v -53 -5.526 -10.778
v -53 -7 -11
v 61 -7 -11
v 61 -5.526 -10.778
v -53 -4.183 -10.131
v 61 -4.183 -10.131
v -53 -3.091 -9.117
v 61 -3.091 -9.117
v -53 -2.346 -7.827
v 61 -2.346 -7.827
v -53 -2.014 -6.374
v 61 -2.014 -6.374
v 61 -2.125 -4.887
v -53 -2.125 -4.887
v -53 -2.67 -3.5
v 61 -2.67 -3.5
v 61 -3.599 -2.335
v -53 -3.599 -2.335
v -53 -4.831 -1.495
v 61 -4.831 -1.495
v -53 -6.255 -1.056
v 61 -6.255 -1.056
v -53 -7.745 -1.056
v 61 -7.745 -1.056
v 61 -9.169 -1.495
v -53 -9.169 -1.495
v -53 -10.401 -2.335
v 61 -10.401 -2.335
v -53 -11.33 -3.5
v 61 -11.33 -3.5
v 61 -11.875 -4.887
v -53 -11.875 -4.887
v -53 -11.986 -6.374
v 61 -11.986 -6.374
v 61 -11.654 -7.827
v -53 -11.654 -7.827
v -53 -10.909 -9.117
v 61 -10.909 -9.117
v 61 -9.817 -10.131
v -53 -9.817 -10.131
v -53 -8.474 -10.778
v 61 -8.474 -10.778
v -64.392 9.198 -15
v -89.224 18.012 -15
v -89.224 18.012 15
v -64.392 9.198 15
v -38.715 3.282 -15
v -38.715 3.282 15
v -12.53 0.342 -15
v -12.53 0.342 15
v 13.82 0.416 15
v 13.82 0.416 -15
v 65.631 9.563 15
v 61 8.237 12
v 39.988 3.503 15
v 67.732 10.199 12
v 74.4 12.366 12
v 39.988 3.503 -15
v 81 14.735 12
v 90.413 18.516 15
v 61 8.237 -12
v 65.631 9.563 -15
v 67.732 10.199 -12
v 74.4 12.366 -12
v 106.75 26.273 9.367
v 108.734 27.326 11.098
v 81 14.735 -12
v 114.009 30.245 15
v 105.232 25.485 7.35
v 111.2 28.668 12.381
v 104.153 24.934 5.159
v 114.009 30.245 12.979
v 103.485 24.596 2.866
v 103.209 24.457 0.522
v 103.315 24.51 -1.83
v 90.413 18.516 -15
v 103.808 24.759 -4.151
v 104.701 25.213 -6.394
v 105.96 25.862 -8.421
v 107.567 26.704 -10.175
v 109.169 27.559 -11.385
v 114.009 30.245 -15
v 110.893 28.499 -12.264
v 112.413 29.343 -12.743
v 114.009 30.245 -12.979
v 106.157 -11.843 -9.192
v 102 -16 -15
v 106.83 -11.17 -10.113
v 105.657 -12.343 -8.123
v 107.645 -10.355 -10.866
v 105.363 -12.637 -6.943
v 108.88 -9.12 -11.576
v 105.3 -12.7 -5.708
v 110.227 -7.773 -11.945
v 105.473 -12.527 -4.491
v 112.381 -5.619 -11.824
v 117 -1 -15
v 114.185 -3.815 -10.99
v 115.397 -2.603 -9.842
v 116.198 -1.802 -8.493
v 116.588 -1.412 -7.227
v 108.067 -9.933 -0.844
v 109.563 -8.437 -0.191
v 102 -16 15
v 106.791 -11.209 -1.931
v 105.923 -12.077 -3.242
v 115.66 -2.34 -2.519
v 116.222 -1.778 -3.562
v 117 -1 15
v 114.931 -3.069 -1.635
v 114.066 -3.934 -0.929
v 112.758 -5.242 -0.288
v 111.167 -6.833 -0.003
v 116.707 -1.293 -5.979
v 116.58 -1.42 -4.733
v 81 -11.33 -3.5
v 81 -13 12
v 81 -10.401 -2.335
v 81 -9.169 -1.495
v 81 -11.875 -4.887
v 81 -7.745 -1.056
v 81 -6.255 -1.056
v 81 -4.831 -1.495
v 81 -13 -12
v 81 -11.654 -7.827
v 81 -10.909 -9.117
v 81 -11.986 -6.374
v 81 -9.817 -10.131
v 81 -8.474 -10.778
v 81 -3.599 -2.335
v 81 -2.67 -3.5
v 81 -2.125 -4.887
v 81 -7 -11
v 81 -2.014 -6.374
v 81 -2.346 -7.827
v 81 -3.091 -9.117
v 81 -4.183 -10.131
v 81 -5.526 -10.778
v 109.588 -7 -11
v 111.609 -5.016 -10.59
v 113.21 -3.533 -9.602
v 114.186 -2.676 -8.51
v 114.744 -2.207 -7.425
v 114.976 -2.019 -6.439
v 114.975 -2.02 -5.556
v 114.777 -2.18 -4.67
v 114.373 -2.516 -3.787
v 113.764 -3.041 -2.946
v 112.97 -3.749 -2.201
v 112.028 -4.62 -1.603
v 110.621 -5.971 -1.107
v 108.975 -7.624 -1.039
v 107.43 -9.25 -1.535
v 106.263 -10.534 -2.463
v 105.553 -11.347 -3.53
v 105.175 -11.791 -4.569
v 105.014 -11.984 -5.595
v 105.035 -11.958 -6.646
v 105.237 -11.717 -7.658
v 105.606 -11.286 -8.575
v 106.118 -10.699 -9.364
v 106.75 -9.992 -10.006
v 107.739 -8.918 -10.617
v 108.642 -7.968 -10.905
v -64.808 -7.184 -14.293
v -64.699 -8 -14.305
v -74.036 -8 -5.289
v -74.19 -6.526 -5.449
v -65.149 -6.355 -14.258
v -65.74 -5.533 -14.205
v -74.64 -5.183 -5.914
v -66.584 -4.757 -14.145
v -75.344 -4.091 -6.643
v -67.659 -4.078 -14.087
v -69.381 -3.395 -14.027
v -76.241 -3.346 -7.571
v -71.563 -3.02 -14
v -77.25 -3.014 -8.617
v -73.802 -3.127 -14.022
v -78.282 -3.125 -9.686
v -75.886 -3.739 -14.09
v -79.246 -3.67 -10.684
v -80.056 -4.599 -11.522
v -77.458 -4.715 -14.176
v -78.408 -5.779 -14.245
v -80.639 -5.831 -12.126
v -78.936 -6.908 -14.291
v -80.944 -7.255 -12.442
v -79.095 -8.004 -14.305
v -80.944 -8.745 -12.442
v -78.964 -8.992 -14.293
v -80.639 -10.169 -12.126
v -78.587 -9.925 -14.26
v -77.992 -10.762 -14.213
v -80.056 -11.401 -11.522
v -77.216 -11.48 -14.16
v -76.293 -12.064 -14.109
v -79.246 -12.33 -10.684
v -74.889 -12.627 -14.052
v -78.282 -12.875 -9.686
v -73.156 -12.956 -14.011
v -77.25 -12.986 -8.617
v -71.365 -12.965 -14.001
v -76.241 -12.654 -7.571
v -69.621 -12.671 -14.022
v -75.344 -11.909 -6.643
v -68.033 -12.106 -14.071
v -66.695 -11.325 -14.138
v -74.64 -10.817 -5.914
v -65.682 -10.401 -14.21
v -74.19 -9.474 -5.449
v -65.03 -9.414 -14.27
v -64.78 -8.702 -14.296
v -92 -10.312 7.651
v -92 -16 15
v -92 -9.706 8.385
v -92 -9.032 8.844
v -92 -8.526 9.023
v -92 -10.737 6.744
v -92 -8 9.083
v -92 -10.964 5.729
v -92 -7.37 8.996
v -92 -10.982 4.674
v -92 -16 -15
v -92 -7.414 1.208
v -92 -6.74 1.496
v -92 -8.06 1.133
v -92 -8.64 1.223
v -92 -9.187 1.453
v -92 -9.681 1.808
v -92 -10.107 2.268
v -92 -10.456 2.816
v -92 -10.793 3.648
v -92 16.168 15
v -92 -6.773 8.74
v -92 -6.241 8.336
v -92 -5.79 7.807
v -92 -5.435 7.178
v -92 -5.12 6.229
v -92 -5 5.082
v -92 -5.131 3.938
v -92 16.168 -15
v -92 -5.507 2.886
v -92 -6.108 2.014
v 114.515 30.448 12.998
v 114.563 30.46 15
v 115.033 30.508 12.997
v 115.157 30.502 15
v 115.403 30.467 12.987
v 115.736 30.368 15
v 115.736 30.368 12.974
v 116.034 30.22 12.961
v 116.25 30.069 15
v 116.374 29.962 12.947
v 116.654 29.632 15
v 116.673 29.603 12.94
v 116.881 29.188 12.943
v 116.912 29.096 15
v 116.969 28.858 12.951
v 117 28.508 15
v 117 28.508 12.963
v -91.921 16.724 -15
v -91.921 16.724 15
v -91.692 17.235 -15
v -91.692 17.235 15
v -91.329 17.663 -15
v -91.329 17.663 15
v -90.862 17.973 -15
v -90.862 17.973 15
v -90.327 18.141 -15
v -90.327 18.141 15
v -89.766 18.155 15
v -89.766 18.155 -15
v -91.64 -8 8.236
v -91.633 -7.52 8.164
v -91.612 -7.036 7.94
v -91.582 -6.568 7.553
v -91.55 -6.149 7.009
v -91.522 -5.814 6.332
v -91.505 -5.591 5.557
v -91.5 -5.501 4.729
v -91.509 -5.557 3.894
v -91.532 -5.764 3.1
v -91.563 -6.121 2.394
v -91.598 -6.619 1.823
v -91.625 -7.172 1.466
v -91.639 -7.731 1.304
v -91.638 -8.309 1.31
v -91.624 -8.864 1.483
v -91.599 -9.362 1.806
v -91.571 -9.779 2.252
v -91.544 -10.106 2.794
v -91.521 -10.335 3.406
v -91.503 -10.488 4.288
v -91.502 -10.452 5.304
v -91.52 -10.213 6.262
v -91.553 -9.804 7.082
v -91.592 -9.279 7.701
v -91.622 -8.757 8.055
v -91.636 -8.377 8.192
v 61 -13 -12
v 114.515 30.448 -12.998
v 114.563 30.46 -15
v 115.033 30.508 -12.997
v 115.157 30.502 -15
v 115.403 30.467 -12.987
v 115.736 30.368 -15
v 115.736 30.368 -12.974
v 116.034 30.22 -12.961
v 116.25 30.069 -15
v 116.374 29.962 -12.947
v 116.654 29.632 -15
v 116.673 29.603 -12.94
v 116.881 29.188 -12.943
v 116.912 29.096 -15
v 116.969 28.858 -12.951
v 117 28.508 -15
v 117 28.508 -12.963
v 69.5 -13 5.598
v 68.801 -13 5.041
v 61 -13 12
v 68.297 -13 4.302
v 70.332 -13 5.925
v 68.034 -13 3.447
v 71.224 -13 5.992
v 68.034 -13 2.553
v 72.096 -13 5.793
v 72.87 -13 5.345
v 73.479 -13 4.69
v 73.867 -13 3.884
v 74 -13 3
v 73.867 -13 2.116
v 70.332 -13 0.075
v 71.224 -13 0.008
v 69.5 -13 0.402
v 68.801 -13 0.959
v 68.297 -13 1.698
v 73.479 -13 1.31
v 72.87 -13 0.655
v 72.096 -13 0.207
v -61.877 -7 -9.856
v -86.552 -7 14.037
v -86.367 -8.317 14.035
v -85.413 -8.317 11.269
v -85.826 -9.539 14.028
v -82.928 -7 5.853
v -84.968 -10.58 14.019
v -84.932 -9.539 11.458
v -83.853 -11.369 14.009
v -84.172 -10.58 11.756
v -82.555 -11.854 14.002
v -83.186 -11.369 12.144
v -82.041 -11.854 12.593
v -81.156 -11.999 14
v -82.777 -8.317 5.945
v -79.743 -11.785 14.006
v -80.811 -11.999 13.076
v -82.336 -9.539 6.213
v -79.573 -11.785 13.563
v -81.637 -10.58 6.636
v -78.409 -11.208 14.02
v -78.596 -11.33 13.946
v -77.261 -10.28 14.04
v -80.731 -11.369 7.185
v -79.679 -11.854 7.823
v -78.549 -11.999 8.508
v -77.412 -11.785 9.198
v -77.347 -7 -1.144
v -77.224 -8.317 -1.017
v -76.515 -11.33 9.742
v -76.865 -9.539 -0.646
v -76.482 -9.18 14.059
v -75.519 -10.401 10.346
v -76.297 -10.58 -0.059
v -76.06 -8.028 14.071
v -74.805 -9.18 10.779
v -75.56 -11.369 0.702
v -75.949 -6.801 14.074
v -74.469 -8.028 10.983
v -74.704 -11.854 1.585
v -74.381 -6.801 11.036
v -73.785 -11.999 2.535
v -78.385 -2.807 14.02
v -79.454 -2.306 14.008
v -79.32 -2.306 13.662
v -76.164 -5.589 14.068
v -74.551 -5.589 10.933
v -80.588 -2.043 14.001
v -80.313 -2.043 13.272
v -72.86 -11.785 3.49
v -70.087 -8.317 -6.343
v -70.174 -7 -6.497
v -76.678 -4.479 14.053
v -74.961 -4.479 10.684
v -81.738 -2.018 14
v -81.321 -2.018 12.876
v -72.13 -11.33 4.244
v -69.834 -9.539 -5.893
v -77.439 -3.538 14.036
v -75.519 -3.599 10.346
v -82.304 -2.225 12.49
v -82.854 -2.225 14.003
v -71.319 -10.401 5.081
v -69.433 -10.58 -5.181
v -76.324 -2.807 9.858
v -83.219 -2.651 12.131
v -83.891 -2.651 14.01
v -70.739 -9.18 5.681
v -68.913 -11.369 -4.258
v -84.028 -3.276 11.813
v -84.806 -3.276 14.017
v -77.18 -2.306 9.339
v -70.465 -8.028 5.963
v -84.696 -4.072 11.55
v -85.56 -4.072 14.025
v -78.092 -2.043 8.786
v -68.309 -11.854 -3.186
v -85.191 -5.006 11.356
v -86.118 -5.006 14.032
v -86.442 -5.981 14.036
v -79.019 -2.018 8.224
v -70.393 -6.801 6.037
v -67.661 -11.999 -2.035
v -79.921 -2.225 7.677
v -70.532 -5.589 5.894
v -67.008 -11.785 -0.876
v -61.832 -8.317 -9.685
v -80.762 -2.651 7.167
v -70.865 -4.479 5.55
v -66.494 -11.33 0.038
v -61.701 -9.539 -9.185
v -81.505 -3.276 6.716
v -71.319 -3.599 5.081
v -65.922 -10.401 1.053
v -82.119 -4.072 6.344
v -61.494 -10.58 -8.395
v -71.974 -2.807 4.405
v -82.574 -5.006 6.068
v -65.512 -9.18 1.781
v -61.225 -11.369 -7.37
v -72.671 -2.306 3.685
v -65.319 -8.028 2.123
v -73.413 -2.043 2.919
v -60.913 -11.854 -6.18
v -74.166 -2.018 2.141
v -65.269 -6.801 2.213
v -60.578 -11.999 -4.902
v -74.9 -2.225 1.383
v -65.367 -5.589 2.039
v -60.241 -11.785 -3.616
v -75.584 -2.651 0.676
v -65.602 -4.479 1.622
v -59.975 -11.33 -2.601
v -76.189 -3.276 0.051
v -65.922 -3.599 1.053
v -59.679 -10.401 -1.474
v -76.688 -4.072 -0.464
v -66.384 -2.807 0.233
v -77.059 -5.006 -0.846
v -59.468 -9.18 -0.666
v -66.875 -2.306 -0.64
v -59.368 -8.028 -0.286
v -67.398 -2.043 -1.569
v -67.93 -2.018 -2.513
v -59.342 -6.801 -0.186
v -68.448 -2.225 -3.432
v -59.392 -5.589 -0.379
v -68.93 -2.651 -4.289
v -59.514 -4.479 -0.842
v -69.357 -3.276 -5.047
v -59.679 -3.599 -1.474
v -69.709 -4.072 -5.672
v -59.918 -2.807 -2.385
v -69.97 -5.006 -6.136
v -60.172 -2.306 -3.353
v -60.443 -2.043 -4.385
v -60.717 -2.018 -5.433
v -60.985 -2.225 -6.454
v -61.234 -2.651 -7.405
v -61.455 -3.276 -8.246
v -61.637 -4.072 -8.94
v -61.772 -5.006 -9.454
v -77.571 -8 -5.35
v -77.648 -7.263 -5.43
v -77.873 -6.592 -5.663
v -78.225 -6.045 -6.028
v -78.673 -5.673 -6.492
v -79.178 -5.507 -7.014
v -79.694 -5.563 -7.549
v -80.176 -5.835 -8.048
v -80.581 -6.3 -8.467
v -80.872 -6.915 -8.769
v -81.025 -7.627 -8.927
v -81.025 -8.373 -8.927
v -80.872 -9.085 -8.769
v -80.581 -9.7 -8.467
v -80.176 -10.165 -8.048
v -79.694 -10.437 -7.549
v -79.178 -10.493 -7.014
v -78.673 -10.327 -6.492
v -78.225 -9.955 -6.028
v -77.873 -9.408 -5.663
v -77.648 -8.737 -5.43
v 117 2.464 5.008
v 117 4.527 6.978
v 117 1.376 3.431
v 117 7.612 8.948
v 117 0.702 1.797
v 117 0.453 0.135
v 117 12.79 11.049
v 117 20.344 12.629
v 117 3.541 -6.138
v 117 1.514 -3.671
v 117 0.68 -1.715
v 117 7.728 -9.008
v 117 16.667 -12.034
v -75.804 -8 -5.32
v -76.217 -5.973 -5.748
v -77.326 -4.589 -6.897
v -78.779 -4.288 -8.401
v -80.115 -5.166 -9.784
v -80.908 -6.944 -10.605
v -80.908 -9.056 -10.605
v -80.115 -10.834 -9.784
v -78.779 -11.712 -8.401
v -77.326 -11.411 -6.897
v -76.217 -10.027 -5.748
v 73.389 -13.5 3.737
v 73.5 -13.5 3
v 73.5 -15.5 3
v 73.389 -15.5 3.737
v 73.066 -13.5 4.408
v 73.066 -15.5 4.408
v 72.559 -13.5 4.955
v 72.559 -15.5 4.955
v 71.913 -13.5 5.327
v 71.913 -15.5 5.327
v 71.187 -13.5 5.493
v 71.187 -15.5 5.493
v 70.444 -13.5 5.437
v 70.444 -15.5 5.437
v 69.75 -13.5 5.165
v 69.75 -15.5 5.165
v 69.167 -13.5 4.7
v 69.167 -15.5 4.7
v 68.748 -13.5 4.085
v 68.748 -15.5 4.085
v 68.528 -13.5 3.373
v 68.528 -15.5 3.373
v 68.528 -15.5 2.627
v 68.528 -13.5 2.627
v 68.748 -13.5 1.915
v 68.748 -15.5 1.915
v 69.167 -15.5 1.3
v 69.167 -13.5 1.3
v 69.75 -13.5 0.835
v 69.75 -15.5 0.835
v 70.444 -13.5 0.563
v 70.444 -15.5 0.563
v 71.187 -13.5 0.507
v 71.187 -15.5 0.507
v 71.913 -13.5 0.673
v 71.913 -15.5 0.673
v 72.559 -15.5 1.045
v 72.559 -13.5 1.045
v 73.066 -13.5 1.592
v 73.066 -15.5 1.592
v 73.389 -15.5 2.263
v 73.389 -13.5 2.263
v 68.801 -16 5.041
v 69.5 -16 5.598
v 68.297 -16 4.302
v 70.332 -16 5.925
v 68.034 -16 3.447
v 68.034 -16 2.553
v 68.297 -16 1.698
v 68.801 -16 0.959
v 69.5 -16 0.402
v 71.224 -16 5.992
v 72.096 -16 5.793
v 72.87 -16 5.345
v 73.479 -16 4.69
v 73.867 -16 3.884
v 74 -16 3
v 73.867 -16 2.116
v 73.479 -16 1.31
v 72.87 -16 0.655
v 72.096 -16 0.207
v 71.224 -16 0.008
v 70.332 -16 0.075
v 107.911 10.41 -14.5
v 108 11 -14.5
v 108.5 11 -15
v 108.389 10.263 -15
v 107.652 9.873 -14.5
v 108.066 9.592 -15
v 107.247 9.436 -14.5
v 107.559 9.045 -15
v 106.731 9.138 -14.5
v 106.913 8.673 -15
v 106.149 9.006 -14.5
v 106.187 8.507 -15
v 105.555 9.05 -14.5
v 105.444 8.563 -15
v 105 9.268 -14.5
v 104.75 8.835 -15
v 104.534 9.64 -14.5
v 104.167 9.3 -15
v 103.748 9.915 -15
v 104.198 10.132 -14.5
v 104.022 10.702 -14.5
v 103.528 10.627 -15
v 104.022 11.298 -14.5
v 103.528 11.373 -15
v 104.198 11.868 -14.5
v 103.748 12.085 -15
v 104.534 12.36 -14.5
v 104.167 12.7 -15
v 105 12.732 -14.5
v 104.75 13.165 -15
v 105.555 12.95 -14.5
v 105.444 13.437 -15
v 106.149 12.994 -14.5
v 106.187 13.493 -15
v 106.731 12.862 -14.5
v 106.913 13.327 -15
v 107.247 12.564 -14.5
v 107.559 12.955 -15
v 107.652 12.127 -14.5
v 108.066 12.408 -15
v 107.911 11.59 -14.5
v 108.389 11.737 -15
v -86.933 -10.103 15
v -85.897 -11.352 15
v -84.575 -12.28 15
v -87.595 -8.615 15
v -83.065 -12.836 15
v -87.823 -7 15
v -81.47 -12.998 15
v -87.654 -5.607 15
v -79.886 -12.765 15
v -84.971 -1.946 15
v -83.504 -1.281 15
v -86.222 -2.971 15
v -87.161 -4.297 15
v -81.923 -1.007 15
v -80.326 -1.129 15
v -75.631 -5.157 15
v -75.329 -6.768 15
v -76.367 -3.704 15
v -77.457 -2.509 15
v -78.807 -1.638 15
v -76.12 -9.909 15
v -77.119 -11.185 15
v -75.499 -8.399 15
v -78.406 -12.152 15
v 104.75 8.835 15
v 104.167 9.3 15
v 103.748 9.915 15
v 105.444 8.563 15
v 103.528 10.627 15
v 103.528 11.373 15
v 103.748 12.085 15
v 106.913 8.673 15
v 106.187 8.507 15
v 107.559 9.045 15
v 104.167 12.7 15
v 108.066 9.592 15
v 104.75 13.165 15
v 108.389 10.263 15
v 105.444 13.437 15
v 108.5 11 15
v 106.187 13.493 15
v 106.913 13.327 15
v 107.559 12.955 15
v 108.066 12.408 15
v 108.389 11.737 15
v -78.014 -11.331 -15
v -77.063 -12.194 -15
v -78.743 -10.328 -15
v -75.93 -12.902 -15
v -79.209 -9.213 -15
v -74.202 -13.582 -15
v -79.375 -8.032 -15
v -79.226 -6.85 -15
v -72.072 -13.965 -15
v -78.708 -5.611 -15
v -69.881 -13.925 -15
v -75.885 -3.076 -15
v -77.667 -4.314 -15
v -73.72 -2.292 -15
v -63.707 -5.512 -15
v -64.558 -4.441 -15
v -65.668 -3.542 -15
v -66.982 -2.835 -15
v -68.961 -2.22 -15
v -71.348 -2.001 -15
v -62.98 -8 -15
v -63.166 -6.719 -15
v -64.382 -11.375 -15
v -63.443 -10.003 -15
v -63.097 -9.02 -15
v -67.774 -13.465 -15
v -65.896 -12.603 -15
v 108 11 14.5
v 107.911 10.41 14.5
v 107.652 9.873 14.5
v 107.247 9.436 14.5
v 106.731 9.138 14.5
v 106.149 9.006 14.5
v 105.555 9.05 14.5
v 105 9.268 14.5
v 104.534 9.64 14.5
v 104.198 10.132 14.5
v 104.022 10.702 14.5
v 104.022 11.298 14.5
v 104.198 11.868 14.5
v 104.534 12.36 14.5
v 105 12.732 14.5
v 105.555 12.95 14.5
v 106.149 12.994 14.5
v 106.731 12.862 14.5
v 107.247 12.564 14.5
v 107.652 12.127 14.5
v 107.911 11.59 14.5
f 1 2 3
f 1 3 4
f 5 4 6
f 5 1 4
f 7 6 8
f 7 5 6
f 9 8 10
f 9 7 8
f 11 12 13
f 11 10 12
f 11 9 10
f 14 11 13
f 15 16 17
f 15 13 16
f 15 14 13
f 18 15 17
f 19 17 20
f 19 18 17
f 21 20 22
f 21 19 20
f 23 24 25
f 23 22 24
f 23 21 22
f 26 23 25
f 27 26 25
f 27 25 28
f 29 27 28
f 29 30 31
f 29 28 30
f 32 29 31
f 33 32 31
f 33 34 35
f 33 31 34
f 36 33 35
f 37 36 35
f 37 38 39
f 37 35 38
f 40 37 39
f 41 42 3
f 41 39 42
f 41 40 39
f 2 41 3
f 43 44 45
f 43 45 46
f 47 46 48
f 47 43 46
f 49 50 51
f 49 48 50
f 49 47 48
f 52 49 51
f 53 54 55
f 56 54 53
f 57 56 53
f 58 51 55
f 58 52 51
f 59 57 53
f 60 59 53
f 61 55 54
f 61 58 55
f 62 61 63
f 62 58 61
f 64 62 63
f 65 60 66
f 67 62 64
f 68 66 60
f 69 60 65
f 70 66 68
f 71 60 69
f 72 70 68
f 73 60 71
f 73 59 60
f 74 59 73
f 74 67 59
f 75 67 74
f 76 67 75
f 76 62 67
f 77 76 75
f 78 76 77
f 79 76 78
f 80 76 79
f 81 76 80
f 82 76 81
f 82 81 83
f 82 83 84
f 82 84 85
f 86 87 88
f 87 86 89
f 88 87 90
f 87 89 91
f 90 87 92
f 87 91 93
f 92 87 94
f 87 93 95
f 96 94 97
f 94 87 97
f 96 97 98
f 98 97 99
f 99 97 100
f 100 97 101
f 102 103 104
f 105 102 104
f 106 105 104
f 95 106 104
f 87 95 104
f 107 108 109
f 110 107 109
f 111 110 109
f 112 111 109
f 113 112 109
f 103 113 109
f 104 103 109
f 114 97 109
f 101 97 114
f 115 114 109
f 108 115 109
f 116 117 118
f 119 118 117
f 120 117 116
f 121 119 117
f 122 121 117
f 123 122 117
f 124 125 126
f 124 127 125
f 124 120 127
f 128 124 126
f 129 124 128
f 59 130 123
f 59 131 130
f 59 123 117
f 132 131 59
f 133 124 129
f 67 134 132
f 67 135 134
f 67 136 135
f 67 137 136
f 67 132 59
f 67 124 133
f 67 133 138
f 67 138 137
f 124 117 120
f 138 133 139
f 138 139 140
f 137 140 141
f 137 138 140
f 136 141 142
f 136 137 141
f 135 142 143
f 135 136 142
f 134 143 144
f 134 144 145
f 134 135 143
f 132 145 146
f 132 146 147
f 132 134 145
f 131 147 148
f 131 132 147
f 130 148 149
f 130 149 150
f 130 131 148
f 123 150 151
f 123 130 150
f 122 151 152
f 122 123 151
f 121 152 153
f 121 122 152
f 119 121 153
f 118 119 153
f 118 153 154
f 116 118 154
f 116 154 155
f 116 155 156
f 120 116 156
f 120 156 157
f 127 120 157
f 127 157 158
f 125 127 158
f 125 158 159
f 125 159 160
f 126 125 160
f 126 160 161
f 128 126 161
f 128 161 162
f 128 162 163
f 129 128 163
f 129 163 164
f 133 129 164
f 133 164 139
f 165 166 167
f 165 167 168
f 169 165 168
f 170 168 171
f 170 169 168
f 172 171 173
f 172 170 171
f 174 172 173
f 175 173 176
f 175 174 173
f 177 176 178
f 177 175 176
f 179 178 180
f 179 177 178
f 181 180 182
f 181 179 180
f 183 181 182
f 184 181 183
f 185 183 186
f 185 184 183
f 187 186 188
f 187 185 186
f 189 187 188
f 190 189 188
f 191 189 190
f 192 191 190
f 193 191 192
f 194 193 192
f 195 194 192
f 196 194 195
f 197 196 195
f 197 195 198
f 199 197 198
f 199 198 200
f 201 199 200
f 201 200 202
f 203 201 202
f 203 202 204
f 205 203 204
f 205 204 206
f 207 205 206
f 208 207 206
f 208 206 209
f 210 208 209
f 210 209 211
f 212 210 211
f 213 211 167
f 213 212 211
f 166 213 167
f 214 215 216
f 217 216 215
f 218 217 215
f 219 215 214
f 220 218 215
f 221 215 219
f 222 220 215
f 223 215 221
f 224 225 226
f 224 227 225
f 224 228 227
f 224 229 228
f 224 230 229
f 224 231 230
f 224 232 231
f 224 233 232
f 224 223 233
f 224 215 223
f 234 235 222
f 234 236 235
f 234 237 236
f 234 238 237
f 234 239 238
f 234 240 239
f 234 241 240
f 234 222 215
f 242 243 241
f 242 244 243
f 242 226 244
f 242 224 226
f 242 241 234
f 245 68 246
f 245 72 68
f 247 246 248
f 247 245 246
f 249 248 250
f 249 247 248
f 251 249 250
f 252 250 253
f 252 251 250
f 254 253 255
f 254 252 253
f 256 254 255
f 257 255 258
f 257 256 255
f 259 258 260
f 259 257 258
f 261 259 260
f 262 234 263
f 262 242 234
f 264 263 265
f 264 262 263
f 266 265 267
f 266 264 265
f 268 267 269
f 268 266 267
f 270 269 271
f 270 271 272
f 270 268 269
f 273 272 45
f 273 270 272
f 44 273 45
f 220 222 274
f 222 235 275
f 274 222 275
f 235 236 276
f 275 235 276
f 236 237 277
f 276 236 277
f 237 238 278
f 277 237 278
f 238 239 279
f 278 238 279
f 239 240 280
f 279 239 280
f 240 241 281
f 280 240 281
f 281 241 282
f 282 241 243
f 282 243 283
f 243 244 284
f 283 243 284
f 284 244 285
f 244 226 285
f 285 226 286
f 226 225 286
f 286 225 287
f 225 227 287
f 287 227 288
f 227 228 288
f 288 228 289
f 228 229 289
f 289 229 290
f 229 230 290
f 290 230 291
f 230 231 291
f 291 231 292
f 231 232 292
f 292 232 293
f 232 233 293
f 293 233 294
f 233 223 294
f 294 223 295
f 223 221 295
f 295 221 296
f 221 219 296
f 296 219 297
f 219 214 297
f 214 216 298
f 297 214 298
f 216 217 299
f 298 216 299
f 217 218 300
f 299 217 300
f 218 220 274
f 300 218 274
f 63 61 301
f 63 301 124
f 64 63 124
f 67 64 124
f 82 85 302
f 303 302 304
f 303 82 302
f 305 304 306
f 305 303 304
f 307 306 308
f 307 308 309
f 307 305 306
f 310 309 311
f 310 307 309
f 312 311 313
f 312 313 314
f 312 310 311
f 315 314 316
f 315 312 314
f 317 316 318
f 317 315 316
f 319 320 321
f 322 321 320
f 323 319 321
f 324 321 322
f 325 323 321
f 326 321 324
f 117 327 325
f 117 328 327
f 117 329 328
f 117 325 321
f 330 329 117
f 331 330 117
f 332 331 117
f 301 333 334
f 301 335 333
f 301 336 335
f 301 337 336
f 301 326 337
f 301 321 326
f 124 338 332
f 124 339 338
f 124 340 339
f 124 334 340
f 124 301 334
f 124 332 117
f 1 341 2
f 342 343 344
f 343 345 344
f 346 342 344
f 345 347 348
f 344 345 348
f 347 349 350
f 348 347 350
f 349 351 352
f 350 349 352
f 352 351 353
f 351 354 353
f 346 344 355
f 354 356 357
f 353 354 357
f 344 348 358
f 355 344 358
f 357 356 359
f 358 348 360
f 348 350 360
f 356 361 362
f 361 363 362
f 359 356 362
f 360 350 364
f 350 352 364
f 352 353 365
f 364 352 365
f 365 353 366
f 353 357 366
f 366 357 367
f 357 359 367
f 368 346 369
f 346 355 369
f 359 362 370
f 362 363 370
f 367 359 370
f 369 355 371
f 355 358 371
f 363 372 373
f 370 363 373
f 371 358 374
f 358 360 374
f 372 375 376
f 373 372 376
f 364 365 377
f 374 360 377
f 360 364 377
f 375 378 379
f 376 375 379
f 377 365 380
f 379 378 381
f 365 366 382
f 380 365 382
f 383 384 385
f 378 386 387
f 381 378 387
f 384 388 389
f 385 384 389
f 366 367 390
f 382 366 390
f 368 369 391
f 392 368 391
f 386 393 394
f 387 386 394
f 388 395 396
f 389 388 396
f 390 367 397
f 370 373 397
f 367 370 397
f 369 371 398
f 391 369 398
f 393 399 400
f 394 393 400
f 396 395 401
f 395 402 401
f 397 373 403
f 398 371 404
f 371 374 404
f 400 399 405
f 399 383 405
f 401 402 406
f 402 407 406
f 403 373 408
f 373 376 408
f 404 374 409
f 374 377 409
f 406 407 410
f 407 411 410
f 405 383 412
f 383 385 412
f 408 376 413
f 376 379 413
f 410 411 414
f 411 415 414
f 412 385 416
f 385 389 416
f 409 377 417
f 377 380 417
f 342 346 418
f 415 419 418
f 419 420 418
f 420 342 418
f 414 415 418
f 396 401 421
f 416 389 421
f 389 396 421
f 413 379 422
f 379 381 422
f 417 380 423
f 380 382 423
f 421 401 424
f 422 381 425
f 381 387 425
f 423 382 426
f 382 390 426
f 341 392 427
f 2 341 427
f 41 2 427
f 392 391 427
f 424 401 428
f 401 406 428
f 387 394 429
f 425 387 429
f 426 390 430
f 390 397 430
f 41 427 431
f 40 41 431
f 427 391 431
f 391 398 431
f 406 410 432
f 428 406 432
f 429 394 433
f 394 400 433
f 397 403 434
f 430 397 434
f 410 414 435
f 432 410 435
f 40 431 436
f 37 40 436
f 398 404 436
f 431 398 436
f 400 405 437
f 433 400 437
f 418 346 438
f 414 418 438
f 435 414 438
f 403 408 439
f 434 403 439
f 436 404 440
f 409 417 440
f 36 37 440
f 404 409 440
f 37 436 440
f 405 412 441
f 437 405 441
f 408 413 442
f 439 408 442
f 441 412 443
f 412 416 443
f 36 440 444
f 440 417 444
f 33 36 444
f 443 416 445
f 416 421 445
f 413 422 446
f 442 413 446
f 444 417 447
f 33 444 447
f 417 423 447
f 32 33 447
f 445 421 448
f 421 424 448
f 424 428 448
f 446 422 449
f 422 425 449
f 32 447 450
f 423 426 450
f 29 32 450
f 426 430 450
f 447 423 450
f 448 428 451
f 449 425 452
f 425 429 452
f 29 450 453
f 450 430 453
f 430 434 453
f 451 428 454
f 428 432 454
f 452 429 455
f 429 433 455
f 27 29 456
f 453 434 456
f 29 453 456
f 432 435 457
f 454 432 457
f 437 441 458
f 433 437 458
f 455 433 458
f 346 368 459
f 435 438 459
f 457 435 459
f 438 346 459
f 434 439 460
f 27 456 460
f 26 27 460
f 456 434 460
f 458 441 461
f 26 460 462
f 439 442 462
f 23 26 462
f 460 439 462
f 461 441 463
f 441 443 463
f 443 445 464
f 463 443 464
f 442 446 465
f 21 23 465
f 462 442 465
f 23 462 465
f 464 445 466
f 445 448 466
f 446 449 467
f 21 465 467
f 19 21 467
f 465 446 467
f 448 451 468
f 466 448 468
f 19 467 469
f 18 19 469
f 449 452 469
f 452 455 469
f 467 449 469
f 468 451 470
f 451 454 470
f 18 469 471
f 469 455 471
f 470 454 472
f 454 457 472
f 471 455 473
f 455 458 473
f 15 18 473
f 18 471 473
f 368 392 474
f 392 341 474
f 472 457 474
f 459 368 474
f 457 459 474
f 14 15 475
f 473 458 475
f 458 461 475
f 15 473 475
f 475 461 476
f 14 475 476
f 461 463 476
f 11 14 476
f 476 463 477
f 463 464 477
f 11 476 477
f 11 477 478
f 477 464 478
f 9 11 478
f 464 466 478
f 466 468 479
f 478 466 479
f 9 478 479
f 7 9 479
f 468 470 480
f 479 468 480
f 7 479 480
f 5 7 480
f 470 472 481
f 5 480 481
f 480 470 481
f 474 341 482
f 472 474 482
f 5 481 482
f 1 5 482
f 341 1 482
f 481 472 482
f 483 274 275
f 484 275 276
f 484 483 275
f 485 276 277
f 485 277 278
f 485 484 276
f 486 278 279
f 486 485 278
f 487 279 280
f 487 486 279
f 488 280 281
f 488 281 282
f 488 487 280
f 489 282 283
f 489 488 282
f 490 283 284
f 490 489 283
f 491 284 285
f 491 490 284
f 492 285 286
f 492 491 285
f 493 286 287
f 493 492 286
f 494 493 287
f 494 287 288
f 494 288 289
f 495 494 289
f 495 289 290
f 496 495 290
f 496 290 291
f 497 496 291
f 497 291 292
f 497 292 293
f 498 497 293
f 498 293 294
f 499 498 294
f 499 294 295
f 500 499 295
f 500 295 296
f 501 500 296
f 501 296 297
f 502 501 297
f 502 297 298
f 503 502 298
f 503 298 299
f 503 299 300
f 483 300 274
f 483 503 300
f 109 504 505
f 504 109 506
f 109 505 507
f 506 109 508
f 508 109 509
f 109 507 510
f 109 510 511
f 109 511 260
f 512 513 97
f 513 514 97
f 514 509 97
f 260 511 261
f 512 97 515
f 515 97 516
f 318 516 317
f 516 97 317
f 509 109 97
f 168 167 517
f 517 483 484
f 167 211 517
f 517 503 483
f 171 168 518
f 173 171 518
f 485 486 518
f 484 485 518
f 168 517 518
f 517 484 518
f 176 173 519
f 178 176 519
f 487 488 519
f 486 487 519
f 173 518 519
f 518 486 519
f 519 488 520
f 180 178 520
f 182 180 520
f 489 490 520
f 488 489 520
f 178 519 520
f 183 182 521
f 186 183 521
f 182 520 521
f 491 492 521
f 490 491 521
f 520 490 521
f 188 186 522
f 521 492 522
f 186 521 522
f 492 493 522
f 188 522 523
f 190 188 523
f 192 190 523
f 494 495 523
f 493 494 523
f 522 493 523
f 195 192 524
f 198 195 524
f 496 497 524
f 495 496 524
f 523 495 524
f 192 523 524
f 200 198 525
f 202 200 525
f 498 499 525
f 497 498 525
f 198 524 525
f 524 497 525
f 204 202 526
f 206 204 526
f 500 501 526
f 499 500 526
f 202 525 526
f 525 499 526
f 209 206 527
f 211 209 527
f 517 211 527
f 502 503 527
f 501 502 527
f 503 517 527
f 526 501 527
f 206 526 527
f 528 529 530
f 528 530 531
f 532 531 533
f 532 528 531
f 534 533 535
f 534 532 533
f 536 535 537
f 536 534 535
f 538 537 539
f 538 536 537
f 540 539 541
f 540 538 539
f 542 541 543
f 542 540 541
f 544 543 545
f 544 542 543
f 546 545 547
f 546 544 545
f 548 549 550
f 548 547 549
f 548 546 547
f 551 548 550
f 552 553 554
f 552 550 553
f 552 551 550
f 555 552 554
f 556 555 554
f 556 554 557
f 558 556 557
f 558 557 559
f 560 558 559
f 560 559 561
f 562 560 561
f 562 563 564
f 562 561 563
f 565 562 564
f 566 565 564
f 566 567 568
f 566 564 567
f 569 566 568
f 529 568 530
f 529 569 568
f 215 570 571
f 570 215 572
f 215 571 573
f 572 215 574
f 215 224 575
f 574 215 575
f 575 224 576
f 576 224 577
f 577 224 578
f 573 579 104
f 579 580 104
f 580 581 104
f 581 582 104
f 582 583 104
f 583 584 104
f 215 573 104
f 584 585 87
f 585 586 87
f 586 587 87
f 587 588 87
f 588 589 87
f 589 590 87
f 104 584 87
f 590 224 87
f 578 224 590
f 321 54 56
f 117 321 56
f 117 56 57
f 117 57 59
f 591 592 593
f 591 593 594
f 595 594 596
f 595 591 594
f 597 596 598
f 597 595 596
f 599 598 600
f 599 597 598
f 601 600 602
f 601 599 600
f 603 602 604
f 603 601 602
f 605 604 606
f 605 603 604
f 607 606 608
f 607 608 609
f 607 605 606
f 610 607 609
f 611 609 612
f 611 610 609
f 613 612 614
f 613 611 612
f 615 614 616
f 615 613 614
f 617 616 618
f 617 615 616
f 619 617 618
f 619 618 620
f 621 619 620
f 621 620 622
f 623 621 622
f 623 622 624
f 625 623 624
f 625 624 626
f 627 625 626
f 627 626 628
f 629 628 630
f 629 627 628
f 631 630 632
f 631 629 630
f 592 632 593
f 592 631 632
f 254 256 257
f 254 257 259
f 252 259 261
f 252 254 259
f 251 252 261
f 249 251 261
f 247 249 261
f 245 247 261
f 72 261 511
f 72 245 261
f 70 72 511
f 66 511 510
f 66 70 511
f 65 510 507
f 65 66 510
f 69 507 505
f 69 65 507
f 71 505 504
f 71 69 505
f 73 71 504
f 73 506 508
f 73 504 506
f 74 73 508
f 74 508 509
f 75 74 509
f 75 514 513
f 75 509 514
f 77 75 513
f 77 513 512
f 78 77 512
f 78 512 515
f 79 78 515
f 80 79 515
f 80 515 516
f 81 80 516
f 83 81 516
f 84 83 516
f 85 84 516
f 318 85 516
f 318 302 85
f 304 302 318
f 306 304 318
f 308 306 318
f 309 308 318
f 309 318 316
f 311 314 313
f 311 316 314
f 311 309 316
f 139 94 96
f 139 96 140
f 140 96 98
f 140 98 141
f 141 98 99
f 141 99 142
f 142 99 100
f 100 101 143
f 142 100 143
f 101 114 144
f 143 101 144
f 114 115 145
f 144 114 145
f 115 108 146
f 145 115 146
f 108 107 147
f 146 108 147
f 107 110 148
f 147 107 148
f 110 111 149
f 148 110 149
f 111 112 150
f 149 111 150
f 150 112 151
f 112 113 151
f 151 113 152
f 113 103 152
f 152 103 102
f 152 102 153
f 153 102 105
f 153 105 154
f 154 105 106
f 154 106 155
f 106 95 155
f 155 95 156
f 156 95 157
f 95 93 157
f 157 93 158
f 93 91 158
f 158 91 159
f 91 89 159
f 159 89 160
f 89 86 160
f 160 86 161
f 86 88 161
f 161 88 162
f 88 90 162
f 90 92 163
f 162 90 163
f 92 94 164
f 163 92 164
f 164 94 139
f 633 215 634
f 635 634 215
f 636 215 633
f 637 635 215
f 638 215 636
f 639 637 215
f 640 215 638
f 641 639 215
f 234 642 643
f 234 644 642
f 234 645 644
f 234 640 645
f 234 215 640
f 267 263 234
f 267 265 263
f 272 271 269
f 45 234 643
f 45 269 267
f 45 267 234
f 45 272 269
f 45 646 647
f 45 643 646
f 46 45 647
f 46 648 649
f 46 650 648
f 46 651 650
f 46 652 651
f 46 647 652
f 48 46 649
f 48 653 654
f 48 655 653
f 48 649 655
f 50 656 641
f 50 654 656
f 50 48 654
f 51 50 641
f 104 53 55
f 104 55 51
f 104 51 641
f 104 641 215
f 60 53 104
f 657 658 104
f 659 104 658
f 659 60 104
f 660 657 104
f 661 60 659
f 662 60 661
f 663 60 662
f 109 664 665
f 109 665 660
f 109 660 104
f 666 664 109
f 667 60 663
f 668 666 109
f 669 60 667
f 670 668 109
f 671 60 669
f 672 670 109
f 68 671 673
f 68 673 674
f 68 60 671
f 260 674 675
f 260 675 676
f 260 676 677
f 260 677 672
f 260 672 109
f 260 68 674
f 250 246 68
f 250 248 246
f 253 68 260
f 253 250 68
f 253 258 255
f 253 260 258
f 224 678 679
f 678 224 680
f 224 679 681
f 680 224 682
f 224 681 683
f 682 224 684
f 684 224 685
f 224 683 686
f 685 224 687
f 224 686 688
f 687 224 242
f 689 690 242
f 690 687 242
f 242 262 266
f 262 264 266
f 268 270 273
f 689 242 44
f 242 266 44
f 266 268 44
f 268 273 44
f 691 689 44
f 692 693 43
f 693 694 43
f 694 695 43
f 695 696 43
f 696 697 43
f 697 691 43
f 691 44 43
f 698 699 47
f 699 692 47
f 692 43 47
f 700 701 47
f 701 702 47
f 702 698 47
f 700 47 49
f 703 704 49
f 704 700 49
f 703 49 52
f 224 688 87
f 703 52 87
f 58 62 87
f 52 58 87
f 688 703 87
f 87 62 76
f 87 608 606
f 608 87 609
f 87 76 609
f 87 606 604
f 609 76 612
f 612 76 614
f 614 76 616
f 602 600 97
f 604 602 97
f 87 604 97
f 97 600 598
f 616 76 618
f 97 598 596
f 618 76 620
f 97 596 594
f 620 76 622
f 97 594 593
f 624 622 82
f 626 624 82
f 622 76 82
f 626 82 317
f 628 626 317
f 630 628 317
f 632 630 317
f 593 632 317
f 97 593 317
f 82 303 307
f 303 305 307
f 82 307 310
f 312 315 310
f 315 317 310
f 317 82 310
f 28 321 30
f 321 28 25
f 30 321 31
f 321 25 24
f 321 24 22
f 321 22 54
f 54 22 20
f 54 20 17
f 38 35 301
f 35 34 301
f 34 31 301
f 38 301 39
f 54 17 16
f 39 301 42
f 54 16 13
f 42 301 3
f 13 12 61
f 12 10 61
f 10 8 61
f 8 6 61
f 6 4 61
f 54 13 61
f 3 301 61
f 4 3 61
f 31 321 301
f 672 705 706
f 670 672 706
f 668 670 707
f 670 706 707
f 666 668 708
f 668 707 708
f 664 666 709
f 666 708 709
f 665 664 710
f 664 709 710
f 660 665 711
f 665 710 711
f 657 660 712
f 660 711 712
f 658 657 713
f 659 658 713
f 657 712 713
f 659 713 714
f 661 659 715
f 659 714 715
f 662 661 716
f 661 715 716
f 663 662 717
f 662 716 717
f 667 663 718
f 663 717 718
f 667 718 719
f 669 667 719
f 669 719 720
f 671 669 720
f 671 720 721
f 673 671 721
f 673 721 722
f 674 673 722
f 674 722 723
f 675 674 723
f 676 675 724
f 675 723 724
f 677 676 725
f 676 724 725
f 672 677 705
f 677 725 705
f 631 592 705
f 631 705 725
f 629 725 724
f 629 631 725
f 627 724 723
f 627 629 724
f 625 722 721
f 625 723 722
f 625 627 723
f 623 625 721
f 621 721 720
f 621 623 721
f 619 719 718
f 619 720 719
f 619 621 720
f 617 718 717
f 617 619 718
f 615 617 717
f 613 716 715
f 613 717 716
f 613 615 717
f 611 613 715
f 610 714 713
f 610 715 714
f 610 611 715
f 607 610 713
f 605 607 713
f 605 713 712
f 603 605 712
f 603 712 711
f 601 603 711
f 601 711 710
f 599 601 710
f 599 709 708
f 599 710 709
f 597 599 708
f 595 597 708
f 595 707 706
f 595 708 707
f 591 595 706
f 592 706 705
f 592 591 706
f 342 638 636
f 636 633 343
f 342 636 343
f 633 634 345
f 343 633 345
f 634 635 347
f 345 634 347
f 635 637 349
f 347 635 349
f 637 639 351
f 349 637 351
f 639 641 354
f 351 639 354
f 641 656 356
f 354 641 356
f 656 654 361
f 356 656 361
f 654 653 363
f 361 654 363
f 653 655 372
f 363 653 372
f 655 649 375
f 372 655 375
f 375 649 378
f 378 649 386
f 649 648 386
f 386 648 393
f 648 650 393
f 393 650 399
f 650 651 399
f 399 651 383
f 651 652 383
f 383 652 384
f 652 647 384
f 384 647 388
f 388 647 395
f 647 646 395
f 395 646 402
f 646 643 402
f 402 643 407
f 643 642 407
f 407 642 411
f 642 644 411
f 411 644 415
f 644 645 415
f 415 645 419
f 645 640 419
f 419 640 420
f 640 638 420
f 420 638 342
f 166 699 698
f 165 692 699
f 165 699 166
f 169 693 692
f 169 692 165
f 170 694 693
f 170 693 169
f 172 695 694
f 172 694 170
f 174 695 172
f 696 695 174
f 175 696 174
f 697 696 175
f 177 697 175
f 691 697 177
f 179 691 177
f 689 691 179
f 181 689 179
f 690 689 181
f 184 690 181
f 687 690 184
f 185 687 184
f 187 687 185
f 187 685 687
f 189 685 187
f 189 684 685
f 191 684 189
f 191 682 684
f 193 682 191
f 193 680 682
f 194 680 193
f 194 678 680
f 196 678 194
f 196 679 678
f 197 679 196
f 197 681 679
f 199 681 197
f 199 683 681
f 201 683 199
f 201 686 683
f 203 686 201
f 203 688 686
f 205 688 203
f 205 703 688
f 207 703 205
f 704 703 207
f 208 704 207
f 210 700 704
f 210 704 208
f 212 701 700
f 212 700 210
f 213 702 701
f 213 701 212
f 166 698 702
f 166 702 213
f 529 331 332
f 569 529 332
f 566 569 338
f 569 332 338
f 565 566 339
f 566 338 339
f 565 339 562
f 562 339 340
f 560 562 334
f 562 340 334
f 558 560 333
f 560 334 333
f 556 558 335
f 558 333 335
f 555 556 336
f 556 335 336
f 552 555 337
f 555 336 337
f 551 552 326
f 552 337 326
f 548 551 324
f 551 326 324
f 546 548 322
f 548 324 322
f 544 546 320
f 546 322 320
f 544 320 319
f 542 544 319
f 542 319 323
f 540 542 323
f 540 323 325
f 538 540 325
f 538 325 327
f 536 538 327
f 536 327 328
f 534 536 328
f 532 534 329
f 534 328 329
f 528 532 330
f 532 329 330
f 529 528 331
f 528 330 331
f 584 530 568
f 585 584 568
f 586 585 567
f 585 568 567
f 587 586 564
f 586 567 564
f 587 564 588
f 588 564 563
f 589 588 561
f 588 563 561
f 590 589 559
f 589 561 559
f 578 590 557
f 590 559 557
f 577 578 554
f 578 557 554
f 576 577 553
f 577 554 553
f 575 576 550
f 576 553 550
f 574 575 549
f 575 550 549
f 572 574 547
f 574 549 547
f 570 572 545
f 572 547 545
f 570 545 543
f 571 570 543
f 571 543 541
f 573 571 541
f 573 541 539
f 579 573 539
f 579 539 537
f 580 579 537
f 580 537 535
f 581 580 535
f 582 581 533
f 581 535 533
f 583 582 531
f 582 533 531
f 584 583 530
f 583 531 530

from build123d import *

# Parameters (mm, degrees)
CYLINDER006_R               = 2.5
CYLINDER006_DEPTH           = 35
BOX004_W                    = 20
BOX004_H                    = 52
BOX004_DEPTH                = 24
CYLINDER005_R               = 5
CYLINDER005_DEPTH           = 20
CYLINDER005_PLACEMENT_ANGLE = 46
CHAMFER001_SIZE             = 4
CYLINDER004_R               = 2.5
CYLINDER004_DEPTH           = 100
CYLINDER004_PLACEMENT_ANGLE = 46
CYLINDER002_R               = 2
CYLINDER002_DEPTH           = 100
BOX_W                       = 10
BOX_H                       = 40
BOX_DEPTH                   = 100
CYLINDER001_R               = 13
CYLINDER001_DEPTH           = 56
CYLINDER_R                  = 230
CYLINDER_DEPTH              = 100
FUSION_PLACEMENT_ANGLE      = 52.3
FUSION001_PLACEMENT_ANGLE   = 22.4
BOX001_W                    = 49
BOX001_H                    = 54
BOX001_DEPTH                = 100
CYLINDER003_R               = 5
CYLINDER003_DEPTH           = 300
TORUS_R                     = 5
BOX003_W                    = 39
BOX003_H                    = 50
BOX003_DEPTH                = 42
BOX002_W                    = 209
BOX002_H                    = 50
BOX002_DEPTH                = 30
CHAMFER_SIZE                = 15
FILLET_R                    = 2
CHAMFER002_SIZE             = 0.5
CHAMFER003_SIZE             = 1
CHAMFER004_SIZE             = 0.5
CHAMFER005_SIZE             = 1
CHAMFER006_SIZE             = 0.5


with BuildPart() as cylinder006:
    # Cylinder006 → Cylinder006 (new body)
    with BuildSketch(Plane(origin=(10, 0, 3), x_dir=(1, 0, 0), z_dir=(0, -1, 0))):
        Circle(CYLINDER006_R)
    extrude(amount=CYLINDER006_DEPTH)


with BuildPart() as fusion005:
    # Box004 → Box004 (new body)
    with BuildSketch(Plane(origin=(0, -13, -12), x_dir=(1, 0, 0), z_dir=(0, 0, 1))):
        with Locations((10, 26)):
            Rectangle(BOX004_W, BOX004_H)
    extrude(amount=BOX004_DEPTH)

    # Fusion005: union Cylinder006
    add(cylinder006.part)


with BuildPart() as fusion005_1:
    # Fusion005 placement: moved
    add(fusion005.part.moved(Location((61, 0, 0))))


with BuildPart() as chamfer001:
    # Cylinder005 → Cylinder005 (new body)
    with BuildSketch(Plane.XY):
        Circle(CYLINDER005_R)
    extrude(amount=CYLINDER005_DEPTH)


with BuildPart() as chamfer001_1:
    # Cylinder005 placement: moved
    add(chamfer001.part.moved(Location((-52, -8, -20))).rotate(Axis((-52, -8, -20), (0, -1, 0)), CYLINDER005_PLACEMENT_ANGLE))

    # Chamfer001
    chamfer001_edges = [chamfer001_1.edges().sort_by_distance(p)[0] for p in [
        (-69.860088, -8, -9.703532),
    ]]
    chamfer(chamfer001_edges, length=CHAMFER001_SIZE)


with BuildPart() as chamfer001_2:
    # Chamfer001 placement: moved
    add(chamfer001_1.part.moved(Location((-14, 0, 0))))


with BuildPart() as cylinder004:
    # Cylinder004 → Cylinder004 (new body)
    with BuildSketch(Plane.XY):
        Circle(CYLINDER004_R)
    extrude(amount=CYLINDER004_DEPTH)


with BuildPart() as cylinder004_1:
    # Cylinder004 placement: moved
    add(cylinder004.part.moved(Location((-66, -8, -20))).rotate(Axis((-66, -8, -20), (0, -1, 0)), CYLINDER004_PLACEMENT_ANGLE))


with BuildPart() as cylinder002:
    # Cylinder002 → Cylinder002 (new body)
    with BuildSketch(Plane(origin=(106, 11, -34), x_dir=(1, 0, 0), z_dir=(0, 0, 1))):
        Circle(CYLINDER002_R)
    extrude(amount=CYLINDER002_DEPTH)


with BuildPart() as cubexxx:
    # Box → Box (new body)
    with BuildSketch(Plane(origin=(1000, -30, -50), x_dir=(1, 0, 0), z_dir=(0, 0, 1))):
        with Locations((5, 20)):
            Rectangle(BOX_W, BOX_H)
    extrude(amount=BOX_DEPTH)


with BuildPart() as cylinder001:
    # Cylinder001 → Cylinder001 (new body)
    with BuildSketch(Plane.XZ.offset(-6)):
        Circle(CYLINDER001_R)
    extrude(amount=CYLINDER001_DEPTH)


with BuildPart() as fusion001:
    # Cylinder → Cylinder (new body)
    with BuildSketch(Plane(origin=(0, 230, -50), x_dir=(1, 0, 0), z_dir=(0, 0, 1))):
        Circle(CYLINDER_R)
    extrude(amount=CYLINDER_DEPTH)

    # Fusion: union Cylinder001
    add(cylinder001.part)


with BuildPart() as fusion001_1:
    # Fusion placement: moved
    add(fusion001.part.moved(Location((181.981413, 89.348781, 0))).rotate(Axis((181.981413, 89.348781, 0), (0, 0, 1)), FUSION_PLACEMENT_ANGLE))

    # Fusion001: union Cubexxx
    add(cubexxx.part)


with BuildPart() as fusion001_2:
    # Fusion001 placement: moved
    add(fusion001_1.part.moved(Location((-87.646187, 17.354412, 0))).rotate(Axis((-87.646187, 17.354412, 0), (0, 0, -1)), FUSION001_PLACEMENT_ANGLE))


with BuildPart() as fusion002:
    # Box001 → Box001 (new body)
    with BuildSketch(Plane(origin=(-141, -28, -50), x_dir=(1, 0, 0), z_dir=(0, 0, 1))):
        with Locations((24.5, 27)):
            Rectangle(BOX001_W, BOX001_H)
    extrude(amount=BOX001_DEPTH)

    # Fusion002: union Fusion001
    add(fusion001_2.part)


with BuildPart() as cylinder003:
    # Cylinder003 → Cylinder003 (new body)
    with BuildSketch(Plane(origin=(-53, -7, 0), x_dir=(0, 0, -1), z_dir=(1, 0, 0))):
        Circle(CYLINDER003_R)
    extrude(amount=CYLINDER003_DEPTH)


with BuildPart() as torus:
    # Torus → Torus (revolve)
    with BuildSketch(Plane(origin=(-53, -7, 30), x_dir=(1, 0, 0), z_dir=(0, 0, -1))):
        with Locations((30, 0)):
            Circle(TORUS_R)
    revolve(axis=Axis((-53, -7, 30), (0, -1, 0)))


with BuildPart() as holes:
    # Box003 → Box003 (new body)
    with BuildSketch(Plane(origin=(-92, -16, -15), x_dir=(1, 0, 0), z_dir=(0, 0, 1))):
        with Locations((19.5, 25)):
            Rectangle(BOX003_W, BOX003_H)
    extrude(amount=BOX003_DEPTH)

    # Common: intersect Torus
    add(torus.part, mode=Mode.INTERSECT)

    # Fusion006: union Cylinder003
    add(cylinder003.part)


with BuildPart() as holes_1:
    # Fusion006 placement: moved
    add(holes.part.moved(Location((0, 0, -6))))

    # Fusion007: union Fusion005, Chamfer001, Cylinder004, Cylinder002, Fusion002
    add(fusion005_1.part)
    add(chamfer001_2.part)
    add(cylinder004_1.part)
    add(cylinder002.part)
    add(fusion002.part)


with BuildPart() as chamfer006:
    # Box002 → Box002 (new body)
    with BuildSketch(Plane(origin=(-92, -16, -15), x_dir=(1, 0, 0), z_dir=(0, 0, 1))):
        with Locations((104.5, 25)):
            Rectangle(BOX002_W, BOX002_H)
    extrude(amount=BOX002_DEPTH)

    # Chamfer
    chamfer_edges = [chamfer006.edges().sort_by_distance(p)[0] for p in [
        (117, -16, 0),
    ]]
    chamfer(chamfer_edges, length=CHAMFER_SIZE)

    # Cut: cut holes
    add(holes_1.part, mode=Mode.SUBTRACT)

    # Fillet
    fillet_edges = [chamfer006.edges().sort_by_distance(p)[0] for p in [
        (117, 31.982324, 13.856394),
        (117, 31.982324, -13.856394),
        (-92, 19.201518, 0),
    ]]
    fillet(fillet_edges, radius=FILLET_R)

    # Chamfer002
    chamfer002_edges = [chamfer006.edges().sort_by_distance(p)[0] for p in [
        (68.5, -16, 3),
        (68.5, -13, 3),
    ]]
    chamfer(chamfer002_edges, length=CHAMFER002_SIZE)

    # Chamfer003
    chamfer003_edges = [chamfer006.edges().sort_by_distance(p)[0] for p in [
        (-86.823069, -7, 15),
        (110.998637, -7.001363, -1),
    ]]
    chamfer(chamfer003_edges, length=CHAMFER003_SIZE)

    # Chamfer004
    chamfer004_edges = [chamfer006.edges().sort_by_distance(p)[0] for p in [
        (104, 11, 15),
        (104, 11, -15),
    ]]
    chamfer(chamfer004_edges, length=CHAMFER004_SIZE)

    # Chamfer005
    chamfer005_edges = [chamfer006.edges().sort_by_distance(p)[0] for p in [
        (-78.375432, -8.003753, -15),
    ]]
    chamfer(chamfer005_edges, length=CHAMFER005_SIZE)

    # Chamfer006
    chamfer006_edges = [chamfer006.edges().sort_by_distance(p)[0] for p in [
        (-92, -7.998647, 1.6325),
    ]]
    chamfer(chamfer006_edges, length=CHAMFER006_SIZE)


solid = chamfer006.part
